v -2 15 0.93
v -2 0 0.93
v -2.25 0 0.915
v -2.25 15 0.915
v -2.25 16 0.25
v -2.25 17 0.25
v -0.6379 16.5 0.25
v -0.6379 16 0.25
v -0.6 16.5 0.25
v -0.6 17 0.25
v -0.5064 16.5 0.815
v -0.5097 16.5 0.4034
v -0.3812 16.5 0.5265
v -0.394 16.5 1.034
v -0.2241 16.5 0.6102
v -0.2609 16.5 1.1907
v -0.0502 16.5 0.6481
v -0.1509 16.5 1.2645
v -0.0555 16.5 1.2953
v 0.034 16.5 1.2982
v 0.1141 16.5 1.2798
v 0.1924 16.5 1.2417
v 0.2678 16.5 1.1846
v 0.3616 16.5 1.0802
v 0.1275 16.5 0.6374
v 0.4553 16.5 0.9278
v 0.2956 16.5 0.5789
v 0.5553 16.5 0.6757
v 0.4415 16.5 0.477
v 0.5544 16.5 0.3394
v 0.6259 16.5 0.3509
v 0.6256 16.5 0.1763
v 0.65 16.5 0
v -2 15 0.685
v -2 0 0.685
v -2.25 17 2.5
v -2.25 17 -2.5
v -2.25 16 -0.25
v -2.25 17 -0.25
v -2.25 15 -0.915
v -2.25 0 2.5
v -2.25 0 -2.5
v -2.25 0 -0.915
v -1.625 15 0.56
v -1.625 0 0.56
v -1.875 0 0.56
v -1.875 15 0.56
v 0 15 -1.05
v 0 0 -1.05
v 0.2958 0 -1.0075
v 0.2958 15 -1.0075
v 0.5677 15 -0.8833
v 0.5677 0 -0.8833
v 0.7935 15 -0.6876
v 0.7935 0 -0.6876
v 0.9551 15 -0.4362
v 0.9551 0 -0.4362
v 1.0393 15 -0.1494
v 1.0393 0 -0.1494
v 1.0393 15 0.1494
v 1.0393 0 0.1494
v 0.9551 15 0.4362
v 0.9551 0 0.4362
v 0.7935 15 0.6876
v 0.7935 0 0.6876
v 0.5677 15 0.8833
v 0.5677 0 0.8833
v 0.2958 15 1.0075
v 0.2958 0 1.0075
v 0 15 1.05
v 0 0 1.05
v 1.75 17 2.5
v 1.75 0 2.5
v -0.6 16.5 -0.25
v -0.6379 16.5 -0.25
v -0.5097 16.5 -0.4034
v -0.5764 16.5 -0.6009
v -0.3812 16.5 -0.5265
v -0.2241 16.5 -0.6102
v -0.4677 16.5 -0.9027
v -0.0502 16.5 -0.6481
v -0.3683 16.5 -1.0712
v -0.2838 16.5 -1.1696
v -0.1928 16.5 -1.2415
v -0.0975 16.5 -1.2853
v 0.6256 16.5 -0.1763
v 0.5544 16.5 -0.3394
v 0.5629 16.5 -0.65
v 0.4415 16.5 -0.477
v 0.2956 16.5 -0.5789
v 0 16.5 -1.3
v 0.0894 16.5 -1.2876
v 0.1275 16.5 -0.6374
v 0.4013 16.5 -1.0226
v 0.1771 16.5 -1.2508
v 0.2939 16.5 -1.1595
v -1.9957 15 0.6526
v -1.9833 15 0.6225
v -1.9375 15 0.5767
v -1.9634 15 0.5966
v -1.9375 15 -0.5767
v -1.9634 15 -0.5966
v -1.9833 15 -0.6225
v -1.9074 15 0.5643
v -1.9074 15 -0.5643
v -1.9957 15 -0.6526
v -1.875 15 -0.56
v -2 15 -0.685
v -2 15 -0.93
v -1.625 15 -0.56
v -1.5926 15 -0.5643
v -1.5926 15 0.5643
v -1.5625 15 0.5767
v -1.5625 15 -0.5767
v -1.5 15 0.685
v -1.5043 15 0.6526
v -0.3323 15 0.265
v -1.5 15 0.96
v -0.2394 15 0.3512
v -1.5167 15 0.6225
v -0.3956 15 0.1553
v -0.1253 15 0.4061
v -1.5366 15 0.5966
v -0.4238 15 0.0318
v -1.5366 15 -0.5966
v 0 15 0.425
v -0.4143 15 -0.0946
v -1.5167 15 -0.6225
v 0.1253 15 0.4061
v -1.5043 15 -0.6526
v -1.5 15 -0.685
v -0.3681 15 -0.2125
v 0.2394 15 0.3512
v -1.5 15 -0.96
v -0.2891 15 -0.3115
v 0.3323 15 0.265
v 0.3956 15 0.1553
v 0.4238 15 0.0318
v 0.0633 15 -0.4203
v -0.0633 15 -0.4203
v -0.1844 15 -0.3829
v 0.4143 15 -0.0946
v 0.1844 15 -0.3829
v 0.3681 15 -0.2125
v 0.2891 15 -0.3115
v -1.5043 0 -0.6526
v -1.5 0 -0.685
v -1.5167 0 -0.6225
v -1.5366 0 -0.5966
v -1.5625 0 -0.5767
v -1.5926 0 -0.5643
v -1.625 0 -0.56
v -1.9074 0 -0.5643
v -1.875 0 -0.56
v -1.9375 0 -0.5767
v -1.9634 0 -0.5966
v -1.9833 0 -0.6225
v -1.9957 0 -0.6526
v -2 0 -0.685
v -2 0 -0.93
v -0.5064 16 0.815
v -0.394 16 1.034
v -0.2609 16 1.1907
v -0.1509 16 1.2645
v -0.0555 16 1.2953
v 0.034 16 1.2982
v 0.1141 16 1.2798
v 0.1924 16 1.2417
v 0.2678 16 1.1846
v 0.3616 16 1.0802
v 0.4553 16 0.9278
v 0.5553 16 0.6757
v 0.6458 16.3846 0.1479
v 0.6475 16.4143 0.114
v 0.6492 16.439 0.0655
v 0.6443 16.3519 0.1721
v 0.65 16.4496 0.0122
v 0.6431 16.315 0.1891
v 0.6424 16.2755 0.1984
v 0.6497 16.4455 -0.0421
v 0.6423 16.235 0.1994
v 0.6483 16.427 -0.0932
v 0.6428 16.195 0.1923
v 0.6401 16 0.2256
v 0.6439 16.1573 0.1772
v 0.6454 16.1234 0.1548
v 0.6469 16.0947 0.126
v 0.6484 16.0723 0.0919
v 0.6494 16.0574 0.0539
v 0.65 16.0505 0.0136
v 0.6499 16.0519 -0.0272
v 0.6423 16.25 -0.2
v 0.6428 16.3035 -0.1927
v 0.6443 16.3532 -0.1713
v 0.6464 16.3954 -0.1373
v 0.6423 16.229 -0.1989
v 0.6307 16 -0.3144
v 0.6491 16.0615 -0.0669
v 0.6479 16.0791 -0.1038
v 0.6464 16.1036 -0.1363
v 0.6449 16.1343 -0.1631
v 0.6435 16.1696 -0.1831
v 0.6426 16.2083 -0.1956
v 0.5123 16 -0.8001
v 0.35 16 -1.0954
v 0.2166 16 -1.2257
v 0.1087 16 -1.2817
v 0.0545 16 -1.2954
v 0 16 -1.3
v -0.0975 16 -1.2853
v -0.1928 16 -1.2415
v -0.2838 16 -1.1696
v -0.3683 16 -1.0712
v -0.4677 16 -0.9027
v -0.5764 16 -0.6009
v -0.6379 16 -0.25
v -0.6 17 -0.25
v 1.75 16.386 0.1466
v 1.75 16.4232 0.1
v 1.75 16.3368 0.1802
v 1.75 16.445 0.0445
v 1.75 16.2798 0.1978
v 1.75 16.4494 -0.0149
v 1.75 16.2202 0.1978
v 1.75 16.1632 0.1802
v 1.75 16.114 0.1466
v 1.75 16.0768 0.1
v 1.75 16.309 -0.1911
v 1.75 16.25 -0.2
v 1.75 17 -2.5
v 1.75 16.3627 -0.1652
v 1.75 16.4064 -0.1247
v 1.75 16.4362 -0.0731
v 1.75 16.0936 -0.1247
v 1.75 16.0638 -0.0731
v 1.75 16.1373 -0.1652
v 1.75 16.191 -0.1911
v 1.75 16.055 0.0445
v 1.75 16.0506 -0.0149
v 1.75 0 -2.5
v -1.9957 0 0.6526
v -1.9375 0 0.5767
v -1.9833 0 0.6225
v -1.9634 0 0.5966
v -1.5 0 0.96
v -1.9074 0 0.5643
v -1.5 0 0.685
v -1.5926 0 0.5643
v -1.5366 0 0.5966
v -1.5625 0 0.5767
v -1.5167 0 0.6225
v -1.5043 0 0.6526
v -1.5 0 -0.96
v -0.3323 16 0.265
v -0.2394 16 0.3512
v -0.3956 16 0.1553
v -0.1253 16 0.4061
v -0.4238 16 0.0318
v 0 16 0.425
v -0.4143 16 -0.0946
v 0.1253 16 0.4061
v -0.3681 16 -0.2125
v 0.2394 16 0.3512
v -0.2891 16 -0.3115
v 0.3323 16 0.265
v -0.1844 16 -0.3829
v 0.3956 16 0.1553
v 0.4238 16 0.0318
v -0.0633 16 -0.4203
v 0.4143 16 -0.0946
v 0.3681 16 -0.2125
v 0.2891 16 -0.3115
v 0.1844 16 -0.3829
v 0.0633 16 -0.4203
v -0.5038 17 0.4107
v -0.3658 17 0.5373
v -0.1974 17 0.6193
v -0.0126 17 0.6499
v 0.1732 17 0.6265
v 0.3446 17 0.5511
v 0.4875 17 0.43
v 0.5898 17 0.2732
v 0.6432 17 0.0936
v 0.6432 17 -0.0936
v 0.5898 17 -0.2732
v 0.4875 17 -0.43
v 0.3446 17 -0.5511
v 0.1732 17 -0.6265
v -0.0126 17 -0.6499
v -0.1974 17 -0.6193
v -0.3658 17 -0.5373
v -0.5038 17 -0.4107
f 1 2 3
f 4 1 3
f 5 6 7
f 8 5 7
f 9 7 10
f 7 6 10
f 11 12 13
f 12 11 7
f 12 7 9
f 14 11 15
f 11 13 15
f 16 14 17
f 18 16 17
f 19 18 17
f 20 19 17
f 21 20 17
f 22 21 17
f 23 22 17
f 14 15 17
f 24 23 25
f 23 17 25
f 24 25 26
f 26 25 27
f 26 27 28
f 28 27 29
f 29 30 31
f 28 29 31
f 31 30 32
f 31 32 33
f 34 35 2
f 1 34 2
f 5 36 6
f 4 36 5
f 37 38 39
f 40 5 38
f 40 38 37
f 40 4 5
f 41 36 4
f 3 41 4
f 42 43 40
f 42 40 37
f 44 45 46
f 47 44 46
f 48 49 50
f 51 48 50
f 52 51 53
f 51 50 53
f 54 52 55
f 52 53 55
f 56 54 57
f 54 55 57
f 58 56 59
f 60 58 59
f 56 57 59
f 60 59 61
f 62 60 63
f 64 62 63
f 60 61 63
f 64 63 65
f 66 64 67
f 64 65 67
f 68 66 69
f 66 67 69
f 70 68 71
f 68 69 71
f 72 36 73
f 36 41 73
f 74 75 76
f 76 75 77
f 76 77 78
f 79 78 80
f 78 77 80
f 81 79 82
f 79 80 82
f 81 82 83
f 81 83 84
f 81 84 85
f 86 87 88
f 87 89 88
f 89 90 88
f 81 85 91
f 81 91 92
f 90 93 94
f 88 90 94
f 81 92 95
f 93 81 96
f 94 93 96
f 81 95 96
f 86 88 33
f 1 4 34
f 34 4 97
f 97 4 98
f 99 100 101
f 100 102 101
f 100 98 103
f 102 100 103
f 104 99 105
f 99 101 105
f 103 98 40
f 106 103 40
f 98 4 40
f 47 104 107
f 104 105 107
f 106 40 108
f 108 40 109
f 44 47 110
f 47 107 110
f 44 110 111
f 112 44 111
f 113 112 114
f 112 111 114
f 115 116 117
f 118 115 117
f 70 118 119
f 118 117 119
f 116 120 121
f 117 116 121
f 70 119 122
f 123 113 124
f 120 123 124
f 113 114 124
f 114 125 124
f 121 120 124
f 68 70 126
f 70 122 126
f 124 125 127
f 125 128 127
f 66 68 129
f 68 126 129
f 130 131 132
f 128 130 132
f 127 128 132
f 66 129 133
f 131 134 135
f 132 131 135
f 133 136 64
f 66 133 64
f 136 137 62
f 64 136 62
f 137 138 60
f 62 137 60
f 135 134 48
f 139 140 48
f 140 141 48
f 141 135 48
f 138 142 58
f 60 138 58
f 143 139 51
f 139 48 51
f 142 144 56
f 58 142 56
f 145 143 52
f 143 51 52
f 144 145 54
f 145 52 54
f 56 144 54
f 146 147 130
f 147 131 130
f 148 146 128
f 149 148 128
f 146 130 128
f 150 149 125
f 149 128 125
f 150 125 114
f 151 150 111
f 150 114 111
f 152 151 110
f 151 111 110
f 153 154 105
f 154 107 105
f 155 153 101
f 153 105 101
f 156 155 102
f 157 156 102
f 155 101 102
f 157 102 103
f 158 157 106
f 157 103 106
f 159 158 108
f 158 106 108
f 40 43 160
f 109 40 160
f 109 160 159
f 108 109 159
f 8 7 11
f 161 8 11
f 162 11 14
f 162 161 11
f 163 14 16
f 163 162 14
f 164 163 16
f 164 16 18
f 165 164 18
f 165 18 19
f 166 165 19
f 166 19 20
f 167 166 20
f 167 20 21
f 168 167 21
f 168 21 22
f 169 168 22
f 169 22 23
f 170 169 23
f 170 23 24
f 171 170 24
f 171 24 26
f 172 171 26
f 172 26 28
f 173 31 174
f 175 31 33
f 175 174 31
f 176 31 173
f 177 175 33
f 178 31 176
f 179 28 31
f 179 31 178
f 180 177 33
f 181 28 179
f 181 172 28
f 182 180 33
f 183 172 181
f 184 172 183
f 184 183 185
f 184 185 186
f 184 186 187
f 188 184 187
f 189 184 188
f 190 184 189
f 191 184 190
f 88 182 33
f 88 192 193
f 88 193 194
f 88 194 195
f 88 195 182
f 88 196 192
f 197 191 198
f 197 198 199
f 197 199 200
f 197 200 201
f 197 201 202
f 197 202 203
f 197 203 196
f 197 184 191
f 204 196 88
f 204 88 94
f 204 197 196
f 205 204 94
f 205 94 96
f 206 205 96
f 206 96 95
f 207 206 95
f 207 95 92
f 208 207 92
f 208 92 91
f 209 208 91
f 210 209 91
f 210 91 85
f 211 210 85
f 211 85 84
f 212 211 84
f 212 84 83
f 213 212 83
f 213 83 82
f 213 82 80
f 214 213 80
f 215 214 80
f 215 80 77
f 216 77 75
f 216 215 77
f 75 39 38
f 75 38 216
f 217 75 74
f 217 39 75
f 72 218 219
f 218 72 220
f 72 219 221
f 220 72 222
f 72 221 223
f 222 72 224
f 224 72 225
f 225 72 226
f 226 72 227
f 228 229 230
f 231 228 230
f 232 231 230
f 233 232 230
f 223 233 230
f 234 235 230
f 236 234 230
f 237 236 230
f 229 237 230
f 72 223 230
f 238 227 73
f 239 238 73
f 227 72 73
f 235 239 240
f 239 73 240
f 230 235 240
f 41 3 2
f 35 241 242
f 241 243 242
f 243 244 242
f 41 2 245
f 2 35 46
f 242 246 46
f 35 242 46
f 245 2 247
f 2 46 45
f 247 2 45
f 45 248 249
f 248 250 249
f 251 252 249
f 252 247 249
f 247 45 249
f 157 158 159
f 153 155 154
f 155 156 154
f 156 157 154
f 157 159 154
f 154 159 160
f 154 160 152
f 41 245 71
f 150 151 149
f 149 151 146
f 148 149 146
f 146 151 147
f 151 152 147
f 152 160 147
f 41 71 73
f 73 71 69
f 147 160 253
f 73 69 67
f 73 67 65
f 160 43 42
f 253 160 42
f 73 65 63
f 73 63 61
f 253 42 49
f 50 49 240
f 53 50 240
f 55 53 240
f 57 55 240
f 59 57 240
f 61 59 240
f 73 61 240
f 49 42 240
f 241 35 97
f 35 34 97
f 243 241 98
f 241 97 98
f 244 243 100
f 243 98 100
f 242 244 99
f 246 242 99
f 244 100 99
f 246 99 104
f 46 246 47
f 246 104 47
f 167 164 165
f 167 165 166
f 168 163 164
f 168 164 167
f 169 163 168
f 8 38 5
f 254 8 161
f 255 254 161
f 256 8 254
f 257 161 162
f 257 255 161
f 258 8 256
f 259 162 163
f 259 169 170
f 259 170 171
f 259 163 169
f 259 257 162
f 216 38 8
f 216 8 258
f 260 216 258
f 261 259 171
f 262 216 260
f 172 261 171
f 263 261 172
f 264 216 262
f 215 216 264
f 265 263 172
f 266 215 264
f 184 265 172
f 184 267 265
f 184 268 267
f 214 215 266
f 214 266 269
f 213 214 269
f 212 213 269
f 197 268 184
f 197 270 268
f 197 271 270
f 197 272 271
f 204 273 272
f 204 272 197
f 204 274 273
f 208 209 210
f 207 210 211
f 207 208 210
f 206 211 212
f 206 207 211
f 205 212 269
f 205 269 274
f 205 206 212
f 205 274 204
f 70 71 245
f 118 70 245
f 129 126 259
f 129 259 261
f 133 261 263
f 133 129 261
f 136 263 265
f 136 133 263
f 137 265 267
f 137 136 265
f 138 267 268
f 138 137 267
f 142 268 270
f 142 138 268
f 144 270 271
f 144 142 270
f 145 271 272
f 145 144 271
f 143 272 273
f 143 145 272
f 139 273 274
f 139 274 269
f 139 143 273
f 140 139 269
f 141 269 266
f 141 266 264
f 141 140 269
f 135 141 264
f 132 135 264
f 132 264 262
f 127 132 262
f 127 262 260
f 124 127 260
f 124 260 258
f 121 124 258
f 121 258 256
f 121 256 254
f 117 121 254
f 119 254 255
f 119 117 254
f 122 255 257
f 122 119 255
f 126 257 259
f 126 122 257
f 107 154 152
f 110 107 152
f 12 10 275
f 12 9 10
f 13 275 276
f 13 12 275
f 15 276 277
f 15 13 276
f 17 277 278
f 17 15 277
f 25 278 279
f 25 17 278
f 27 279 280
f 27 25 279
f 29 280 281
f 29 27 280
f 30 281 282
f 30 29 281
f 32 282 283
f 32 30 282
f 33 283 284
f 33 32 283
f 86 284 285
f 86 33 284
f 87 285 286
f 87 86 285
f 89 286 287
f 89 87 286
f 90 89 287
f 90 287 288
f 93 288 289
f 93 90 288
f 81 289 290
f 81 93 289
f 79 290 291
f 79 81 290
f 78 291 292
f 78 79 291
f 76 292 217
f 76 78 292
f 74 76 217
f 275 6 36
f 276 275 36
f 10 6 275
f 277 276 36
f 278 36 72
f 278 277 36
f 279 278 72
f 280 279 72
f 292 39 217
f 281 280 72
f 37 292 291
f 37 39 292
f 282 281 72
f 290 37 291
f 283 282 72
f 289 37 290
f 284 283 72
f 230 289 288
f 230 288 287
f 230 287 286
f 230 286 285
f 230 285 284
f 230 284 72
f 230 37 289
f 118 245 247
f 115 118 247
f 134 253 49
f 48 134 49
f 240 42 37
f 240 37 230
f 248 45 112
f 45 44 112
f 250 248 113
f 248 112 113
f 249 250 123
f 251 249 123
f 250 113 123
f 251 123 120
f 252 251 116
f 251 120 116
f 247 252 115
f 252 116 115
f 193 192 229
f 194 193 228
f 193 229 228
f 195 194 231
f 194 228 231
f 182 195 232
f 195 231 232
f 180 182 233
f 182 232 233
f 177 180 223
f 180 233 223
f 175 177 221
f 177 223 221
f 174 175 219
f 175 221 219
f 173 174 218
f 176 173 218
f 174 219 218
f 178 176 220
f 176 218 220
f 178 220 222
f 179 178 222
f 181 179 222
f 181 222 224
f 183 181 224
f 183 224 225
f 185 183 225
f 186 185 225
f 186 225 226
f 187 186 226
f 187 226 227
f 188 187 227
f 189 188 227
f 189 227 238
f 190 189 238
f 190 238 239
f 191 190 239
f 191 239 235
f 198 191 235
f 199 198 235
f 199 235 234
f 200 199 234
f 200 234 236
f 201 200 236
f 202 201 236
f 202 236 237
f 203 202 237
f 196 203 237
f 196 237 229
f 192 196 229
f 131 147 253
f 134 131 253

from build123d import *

# Parameters (mm, degrees)
SKETCH5_W           = 4
SKETCH5_H           = 5
BOSS_EXTRUDE3_DEPTH = 15
CUT_EXTRUDE1_DEPTH  = 16.37245914
FILLET1_R           = 0.125
SKETCH6_W           = 4
SKETCH6_H           = 5
SKETCH6_R           = 0.425
BOSS_EXTRUDE4_DEPTH = 1
SKETCH7_W           = 4
SKETCH7_H           = 5
SKETCH7_RX          = 1.3
SKETCH7_RY          = 0.65
BOSS_EXTRUDE5_DEPTH = 0.5
SKETCH9_W           = 4
SKETCH9_H           = 5
SKETCH9_R           = 0.65
BOSS_EXTRUDE6_DEPTH = 0.5
CUT_EXTRUDE2_REACH  = 19.33
SKETCH10_W          = 1.65
SKETCH10_H          = 0.5
CUT_EXTRUDE3_REACH  = 19.642
SKETCH11_R          = 0.2


with BuildPart() as part:
    # Sketch5 → Boss-Extrude3 (new body)
    with BuildSketch(Plane(origin=(0, 0, 0), x_dir=(1, 0, 0), z_dir=(0, 1, 0))):
        with Locations((-0.25, 0)):
            Rectangle(SKETCH5_W, SKETCH5_H)
    extrude(amount=BOSS_EXTRUDE3_DEPTH)

    # Sketch3 → Cut-Extrude1 (cut, through all)
    with BuildSketch(Plane(origin=(0, 0, 0), x_dir=(1, 0, 0), z_dir=(0, 1, 0))):
        with BuildLine():
            Line((-2.5, 0.9), (-2, 0.93))
            Line((-2, 0.93), (-2, 0.56))
            Line((-2, 0.56), (-1.5, 0.56))
            Line((-1.5, 0.56), (-1.5, 0.96))
            Line((-1.5, 0.96), (0, 1.05))
            ThreePointArc((0, 1.05), (1.05, 0), (0, -1.05))
            Line((0, -1.05), (-1.5, -0.96))
            Line((-1.5, -0.96), (-1.5, -0.56))
            Line((-1.5, -0.56), (-2, -0.56))
            Line((-2, -0.56), (-2, -0.93))
            Line((-2, -0.93), (-2.5, -0.9))
            Line((-2.5, -0.9), (-5, -0.9))
            ThreePointArc((-5, -0.9), (-5.9, 0), (-5, 0.9))
            Line((-5, 0.9), (-2.5, 0.9))
        make_face()
    extrude(amount=CUT_EXTRUDE1_DEPTH, mode=Mode.SUBTRACT)

    # Fillet1
    fillet1_edges = [part.edges().sort_by_distance(p)[0] for p in [
        (-1.5, 7.5, -0.56),
        (-2, 7.5, -0.56),
        (-2, 7.5, 0.56),
        (-1.5, 7.5, 0.56),
    ]]
    fillet(fillet1_edges, radius=FILLET1_R)

    # Sketch6 → Boss-Extrude4 (add)
    with BuildSketch(Plane(origin=(0, 15, 0), x_dir=(1, 0, 0), z_dir=(0, 1, 0))):
        with Locations((-0.25, 0)):
            Rectangle(SKETCH6_W, SKETCH6_H)
        with Locations(Location((0, 0, 0), (0, 0, 270))):
            Circle(SKETCH6_R, mode=Mode.SUBTRACT)
    extrude(amount=BOSS_EXTRUDE4_DEPTH)

    # Sketch7 → Boss-Extrude5 (add)
    with BuildSketch(Plane(origin=(0, 16, 0), x_dir=(1, 0, 0), z_dir=(0, 1, 0))):
        with Locations((-0.25, 0)):
            Rectangle(SKETCH7_W, SKETCH7_H)
        with Locations(Location((0, 0), (0, 0, 90))):
            Ellipse(SKETCH7_RX, SKETCH7_RY, mode=Mode.SUBTRACT)
    extrude(amount=BOSS_EXTRUDE5_DEPTH)

    # Sketch9 → Boss-Extrude6 (add)
    with BuildSketch(Plane(origin=(0, 16.5, 0), x_dir=(1, 0, 0), z_dir=(0, 1, 0))):
        with Locations((-0.25, 0)):
            Rectangle(SKETCH9_W, SKETCH9_H)
        Circle(SKETCH9_R, mode=Mode.SUBTRACT)
    extrude(amount=BOSS_EXTRUDE6_DEPTH)

    # Cut-Extrude2: up to this face of the body (flat: up to its plane)
    cut_extrude2_end = Plane(part.part.faces().sort_by_distance((0.0037652, 16, 1.270907163))[0])
    # Sketch10 → Cut-Extrude2 (cut, up to the picked face)
    with BuildSketch(Plane(origin=(0, 17, 0), x_dir=(1, 0, 0), z_dir=(0, 1, 0)), mode=Mode.PRIVATE) as cut_extrude2_sk1:
        with Locations((-1.425, 0)):
            Rectangle(SKETCH10_W, SKETCH10_H)
    cut_extrude2_tool1 = split(extrude(cut_extrude2_sk1.sketch, amount=-CUT_EXTRUDE2_REACH, mode=Mode.PRIVATE), bisect_by=cut_extrude2_end, keep=Keep.BOTH, mode=Mode.PRIVATE)
    add(cut_extrude2_tool1.solids().sort_by(Axis((-1.425, 17, 0), (0, -1, 0)))[0], mode=Mode.SUBTRACT)

    # Sketch11 → Cut-Extrude3 (cut, up to next)
    with BuildSketch(Plane(origin=(1.75, 0, 0), x_dir=(0, 0, -1), z_dir=(1, 0, 0)), mode=Mode.PRIVATE) as cut_extrude3_sk1:
        with Locations((0, 16.25)):
            Circle(SKETCH11_R)
    cut_extrude3_tool1 = extrude(cut_extrude3_sk1.sketch, amount=-CUT_EXTRUDE3_REACH, mode=Mode.PRIVATE) & part.part
    add(cut_extrude3_tool1.solids().sort_by_distance((1.75, 16.25, 0))[0], mode=Mode.SUBTRACT)


solid = part.part
